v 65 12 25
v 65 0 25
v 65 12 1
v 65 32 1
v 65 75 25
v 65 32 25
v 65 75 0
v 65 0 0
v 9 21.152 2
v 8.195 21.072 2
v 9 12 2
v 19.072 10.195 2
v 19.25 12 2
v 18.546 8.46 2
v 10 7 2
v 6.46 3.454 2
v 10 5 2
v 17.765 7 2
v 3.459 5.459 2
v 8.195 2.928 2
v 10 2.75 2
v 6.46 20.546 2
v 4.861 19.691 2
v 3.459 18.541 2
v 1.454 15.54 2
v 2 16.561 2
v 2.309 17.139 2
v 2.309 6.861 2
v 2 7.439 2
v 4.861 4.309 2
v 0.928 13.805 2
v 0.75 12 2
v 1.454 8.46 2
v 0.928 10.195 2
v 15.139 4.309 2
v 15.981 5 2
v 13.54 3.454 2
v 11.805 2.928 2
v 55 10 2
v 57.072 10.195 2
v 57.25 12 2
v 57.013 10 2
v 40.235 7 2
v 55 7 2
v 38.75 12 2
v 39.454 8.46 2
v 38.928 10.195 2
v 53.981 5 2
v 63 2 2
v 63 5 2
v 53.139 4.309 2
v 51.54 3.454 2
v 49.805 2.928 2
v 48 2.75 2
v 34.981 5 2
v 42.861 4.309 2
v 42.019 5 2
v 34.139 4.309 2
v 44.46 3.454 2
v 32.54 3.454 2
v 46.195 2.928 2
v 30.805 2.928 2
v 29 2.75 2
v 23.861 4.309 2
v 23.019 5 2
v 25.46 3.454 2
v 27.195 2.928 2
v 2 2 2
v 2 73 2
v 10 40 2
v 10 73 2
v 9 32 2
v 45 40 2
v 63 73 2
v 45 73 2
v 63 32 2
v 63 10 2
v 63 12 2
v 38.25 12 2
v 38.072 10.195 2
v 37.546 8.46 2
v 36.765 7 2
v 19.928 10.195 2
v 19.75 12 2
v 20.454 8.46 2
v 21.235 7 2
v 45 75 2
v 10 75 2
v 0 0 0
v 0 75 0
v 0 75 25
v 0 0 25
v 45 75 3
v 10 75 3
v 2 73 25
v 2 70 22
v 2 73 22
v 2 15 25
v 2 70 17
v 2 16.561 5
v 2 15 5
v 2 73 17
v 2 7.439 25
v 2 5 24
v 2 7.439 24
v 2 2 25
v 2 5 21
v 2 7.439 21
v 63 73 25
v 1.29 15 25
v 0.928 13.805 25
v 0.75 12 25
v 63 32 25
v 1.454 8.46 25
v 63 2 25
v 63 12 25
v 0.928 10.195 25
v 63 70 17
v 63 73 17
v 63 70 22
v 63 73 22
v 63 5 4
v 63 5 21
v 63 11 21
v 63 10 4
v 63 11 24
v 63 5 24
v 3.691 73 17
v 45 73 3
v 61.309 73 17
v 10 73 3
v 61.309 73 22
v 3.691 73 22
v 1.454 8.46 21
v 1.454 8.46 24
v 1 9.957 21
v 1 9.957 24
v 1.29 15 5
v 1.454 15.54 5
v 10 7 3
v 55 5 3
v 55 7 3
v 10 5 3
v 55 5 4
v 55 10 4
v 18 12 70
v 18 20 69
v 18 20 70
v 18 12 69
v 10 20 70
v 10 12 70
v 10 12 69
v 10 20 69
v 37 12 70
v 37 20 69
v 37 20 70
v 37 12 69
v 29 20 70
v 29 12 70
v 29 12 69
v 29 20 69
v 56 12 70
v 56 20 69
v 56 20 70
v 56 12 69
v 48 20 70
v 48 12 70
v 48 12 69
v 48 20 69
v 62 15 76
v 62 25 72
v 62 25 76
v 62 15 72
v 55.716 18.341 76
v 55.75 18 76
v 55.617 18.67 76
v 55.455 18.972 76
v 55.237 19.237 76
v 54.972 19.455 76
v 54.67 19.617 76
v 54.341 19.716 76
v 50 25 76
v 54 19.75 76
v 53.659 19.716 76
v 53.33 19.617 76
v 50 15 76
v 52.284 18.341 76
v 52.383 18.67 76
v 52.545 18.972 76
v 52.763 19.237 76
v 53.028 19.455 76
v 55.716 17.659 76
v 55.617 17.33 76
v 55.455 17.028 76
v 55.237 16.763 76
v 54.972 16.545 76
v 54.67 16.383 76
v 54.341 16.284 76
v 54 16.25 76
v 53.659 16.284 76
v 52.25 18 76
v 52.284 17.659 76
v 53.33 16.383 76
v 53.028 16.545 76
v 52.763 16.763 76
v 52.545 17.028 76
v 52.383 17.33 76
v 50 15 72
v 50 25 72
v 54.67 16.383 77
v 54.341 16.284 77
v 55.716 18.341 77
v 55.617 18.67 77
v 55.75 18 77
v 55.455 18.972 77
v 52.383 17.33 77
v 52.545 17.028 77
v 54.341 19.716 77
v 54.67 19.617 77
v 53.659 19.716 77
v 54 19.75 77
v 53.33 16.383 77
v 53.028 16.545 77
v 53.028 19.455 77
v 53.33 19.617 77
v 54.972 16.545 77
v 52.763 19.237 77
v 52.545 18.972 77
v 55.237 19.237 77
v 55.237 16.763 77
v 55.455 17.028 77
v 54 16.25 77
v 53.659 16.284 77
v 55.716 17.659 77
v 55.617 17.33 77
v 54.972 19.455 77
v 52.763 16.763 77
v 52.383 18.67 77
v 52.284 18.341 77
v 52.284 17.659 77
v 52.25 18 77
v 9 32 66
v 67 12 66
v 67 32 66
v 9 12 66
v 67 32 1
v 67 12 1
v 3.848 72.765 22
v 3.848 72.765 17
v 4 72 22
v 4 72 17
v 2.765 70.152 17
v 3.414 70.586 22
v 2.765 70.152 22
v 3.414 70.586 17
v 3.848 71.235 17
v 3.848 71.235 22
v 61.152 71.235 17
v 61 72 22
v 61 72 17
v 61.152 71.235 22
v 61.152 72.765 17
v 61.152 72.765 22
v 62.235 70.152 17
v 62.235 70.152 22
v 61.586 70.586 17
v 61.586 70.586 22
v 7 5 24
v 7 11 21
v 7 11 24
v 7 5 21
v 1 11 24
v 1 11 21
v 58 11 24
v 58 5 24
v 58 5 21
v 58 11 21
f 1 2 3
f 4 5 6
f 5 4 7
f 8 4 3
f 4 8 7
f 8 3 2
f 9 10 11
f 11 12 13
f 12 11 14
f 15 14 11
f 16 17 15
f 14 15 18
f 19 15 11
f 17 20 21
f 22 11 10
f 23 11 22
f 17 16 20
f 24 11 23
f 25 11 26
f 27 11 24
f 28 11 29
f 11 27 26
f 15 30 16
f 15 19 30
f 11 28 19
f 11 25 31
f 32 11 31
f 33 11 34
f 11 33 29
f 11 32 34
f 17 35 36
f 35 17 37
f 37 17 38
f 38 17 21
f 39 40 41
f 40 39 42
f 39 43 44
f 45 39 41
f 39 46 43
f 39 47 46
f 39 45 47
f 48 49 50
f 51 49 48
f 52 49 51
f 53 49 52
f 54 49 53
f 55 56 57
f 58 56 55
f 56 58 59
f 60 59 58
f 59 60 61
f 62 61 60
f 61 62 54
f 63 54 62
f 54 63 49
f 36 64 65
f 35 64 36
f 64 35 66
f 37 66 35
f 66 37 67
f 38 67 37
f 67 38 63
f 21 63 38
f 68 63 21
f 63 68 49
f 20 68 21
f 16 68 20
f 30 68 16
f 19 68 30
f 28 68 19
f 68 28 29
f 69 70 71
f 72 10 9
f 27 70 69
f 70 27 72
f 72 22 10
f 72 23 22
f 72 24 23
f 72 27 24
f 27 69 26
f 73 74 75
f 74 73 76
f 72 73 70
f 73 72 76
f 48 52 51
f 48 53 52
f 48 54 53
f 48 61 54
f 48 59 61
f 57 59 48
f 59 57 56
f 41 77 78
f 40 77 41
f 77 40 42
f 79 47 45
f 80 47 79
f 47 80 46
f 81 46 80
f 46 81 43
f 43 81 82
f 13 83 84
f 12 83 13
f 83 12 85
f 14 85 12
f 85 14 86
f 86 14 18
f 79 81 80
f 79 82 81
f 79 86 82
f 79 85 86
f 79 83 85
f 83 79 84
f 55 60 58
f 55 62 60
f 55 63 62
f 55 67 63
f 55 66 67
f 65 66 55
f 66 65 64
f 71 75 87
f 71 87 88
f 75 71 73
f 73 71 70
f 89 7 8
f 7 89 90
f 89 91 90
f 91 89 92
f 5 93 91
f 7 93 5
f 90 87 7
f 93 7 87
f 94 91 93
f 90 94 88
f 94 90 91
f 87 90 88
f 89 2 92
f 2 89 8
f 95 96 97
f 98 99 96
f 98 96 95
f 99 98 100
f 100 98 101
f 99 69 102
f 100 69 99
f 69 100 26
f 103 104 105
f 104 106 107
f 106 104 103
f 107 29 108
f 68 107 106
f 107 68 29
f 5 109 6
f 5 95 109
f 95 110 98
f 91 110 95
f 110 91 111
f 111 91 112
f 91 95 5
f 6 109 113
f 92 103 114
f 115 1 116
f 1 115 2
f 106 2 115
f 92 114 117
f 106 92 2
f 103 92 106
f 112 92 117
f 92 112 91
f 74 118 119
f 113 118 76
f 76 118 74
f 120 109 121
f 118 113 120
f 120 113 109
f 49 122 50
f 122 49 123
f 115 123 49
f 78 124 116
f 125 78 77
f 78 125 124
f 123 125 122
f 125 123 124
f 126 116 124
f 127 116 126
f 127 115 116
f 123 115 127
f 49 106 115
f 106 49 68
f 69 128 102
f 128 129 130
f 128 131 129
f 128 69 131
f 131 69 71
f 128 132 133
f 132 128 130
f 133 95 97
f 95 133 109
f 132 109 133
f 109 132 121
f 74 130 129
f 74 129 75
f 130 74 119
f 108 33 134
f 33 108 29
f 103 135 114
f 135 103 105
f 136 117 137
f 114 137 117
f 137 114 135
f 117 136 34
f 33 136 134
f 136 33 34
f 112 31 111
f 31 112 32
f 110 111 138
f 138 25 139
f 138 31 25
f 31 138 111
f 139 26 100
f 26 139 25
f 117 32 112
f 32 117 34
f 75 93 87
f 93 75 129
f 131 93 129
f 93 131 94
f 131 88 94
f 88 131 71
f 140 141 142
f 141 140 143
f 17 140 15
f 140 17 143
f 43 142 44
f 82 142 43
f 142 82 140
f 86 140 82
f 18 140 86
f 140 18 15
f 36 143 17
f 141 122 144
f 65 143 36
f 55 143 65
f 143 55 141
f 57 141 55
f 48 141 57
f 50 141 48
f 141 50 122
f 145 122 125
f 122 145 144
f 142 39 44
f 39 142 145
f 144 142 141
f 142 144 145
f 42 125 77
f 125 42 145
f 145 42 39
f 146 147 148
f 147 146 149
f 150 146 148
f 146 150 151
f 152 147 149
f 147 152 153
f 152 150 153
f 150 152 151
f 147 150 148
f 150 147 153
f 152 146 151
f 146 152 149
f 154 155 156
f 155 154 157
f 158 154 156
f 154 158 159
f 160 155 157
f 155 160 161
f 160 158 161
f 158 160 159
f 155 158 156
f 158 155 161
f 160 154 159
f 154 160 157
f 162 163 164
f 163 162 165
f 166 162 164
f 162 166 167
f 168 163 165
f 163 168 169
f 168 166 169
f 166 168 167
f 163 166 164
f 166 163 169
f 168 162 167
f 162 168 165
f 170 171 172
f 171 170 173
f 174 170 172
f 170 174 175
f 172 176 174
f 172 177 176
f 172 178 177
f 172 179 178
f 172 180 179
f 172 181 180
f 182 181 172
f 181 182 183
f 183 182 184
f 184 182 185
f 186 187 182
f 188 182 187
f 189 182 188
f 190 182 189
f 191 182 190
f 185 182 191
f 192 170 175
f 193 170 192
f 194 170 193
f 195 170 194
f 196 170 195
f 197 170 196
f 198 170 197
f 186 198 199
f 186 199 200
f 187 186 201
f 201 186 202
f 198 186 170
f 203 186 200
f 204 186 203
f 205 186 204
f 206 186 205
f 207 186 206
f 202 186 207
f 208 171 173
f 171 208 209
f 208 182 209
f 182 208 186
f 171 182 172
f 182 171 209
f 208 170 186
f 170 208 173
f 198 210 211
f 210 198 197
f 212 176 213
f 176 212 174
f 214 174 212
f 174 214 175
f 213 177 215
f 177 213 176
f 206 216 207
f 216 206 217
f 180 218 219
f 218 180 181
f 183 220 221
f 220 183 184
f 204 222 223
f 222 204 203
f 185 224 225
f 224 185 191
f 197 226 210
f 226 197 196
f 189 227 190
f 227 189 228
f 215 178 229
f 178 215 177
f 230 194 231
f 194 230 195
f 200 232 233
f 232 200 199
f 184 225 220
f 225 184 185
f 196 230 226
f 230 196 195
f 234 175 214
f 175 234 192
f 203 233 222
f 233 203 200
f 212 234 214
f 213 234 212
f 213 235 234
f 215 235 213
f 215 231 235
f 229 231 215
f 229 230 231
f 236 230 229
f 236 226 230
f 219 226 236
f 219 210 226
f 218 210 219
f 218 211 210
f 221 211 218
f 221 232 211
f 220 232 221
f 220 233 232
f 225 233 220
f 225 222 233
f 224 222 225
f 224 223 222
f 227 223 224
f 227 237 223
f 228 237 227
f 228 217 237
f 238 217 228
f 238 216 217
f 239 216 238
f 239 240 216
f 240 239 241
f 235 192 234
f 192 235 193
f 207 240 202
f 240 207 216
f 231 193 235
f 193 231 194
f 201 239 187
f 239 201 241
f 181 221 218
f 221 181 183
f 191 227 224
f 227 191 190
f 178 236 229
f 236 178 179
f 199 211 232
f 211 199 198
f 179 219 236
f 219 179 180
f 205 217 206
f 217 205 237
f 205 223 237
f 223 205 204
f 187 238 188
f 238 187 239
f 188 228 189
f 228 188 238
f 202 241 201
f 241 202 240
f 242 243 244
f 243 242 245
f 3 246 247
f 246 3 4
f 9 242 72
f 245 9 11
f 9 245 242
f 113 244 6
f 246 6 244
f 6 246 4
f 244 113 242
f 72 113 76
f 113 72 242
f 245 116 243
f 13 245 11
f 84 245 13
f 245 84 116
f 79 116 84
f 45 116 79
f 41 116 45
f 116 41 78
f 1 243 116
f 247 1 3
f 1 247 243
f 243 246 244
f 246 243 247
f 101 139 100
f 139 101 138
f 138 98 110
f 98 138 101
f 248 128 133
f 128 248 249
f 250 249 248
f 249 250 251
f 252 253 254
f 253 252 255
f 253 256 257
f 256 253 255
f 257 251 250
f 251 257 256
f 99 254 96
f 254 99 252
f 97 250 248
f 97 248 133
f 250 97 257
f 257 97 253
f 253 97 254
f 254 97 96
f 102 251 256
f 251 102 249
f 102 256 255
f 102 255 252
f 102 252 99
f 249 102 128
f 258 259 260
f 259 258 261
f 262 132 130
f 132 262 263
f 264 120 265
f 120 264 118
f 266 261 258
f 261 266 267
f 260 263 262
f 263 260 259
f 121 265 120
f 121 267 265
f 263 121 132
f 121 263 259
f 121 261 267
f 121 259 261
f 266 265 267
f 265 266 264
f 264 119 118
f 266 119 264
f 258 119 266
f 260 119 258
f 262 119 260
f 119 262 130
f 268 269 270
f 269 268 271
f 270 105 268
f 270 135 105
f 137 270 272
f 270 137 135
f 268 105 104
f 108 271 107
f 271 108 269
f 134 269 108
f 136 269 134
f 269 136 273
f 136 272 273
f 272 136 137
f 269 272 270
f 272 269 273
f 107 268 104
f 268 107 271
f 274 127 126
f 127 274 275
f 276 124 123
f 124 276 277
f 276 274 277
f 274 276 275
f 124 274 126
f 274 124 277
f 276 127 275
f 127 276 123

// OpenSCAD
// INTEGRATED ANTENNA ANALYZER - BATTERY COMPARTMENT MODULE
// 3× 18650 LiFePO4 cell holder with spring contacts and BMS
// Mounts inside rear of main enclosure, accessible via door

// Battery cell dimensions (18650 cylindrical)
cell_diameter = 18;    // mm (standard 18650)
cell_length = 65;      // mm (standard height)
cell_spacing = 1;      // 1mm gap between cells (for easy removal)

// Compartment dimensions
compartment_width = 65;    // Contains 3 cells side-by-side: 18+18+18+2mm gaps = 60mm
compartment_length = 75;   // Slightly longer than cell for BMS module
compartment_height = 25;   // Clearance for spring contacts and BMS

// Material thickness
wall_thickness = 2;        // 2mm walls for strength

// Spring contact specifications
spring_contact_thickness = 1;   // 1mm spring steel
spring_compression = 2;         // 2mm compression range

// BMS module dimensions (estimated for TP4056 module)
bms_width = 35;         // mm
bms_height = 45;        // mm
bms_thickness = 3;      // mm

module battery_cell_holder() {
  // Compartment for three 18650 cells in series
  // Cells held in three parallel bores

  cell_row_x = 10;      // First cell X position
  cell_row_y = 12;      // Y position (centered)
  cell_z = wall_thickness;

  // Cell 1 (positive terminal facing forward)
  translate([cell_row_x, cell_row_y, cell_z])
    cylinder(h = cell_length, d = cell_diameter + 0.5, $fn = 32);

  // Cell 2 (middle, terminal facing backward through BMS)
  translate([cell_row_x + cell_diameter + cell_spacing, cell_row_y, cell_z])
    cylinder(h = cell_length, d = cell_diameter + 0.5, $fn = 32);

  // Cell 3 (terminal facing forward)
  translate([cell_row_x + 2*(cell_diameter + cell_spacing), cell_row_y, cell_z])
    cylinder(h = cell_length, d = cell_diameter + 0.5, $fn = 32);
}

module spring_contact_positive() {
  // Spring contacts for positive terminals (top surface)
  // Curved spring that presses against cell positive terminal

  spring_x = 10;
  spring_y = 12;
  spring_z = wall_thickness + cell_length + 2;

  // Three individual springs for each cell
  for (i = [0:2]) {
    contact_x = spring_x + i * (cell_diameter + cell_spacing);
    translate([contact_x, spring_y, spring_z])
      cube([8, 8, spring_contact_thickness]);
  }
}

module negative_terminal_bus() {
  // Copper bus bar (or conductive plastic) connecting negative terminals
  // Runs along bottom, series connection through BMS

  bus_width = 50;
  bus_thickness = 2;
  bus_height = 1;

  translate([10, 5, wall_thickness])
    cube([bus_width, bus_thickness, bus_height]);

  // Connection to BMS negative input
  translate([55, 5, wall_thickness])
    cube([10, 5, 2]);
}

module bms_module_housing() {
  // Recessed area for BMS (battery management system) module
  // TP4056 or BQ24070 mounted on this platform

  bms_platform_x = 10;
  bms_platform_y = 12 + cell_diameter + 10;
  bms_platform_z = wall_thickness;

  // Platform for BMS PCB
  translate([bms_platform_x, bms_platform_y, bms_platform_z])
    cube([bms_width, bms_height, 1]);

  // Mounting posts for BMS PCB (4 corners)
  post_radius = 1.5;  // 3mm diameter posts
  post_height = 3;

  bms_posts = [
    [bms_platform_x + 2, bms_platform_y + 2],
    [bms_platform_x + bms_width - 2, bms_platform_y + 2],
    [bms_platform_x + 2, bms_platform_y + bms_height - 2],
    [bms_platform_x + bms_width - 2, bms_platform_y + bms_height - 2]
  ];

  for (post = bms_posts) {
    translate([post[0], post[1], bms_platform_z])
      cylinder(h = post_height, r = post_radius, $fn = 16);
  }
}

module positive_terminal_connector() {
  // Wire connector for positive output from BMS
  // XT60 or JST-VH connector interface (user-facing)

  connector_x = 50;
  connector_y = 15;
  connector_z = wall_thickness + cell_length + 5;

  // Connector boss (mechanical support)
  translate([connector_x, connector_y, connector_z])
    cube([12, 10, 4]);

  // Wire lug opening (for soldering battery wires)
  translate([connector_x + 4, connector_y + 3, connector_z + 2])
    cylinder(h = 3, d = 3.5, $fn = 32);
}

module compartment_outer_walls() {
  // Outer housing structure
  // Rectangular box with one open side (for rear door closure)

  // Bottom
  translate([0, 0, 0])
    cube([compartment_width, compartment_length, wall_thickness]);

  // Front wall (facing toward RF electronics)
  translate([0, 0, 0])
    cube([wall_thickness, compartment_length, compartment_height]);

  // Back wall (against enclosure rear panel)
  translate([compartment_width - wall_thickness, 0, 0])
    cube([wall_thickness, compartment_length, compartment_height]);

  // Side walls (left and right)
  translate([0, 0, 0])
    cube([compartment_width, wall_thickness, compartment_height]);

  translate([0, compartment_length - wall_thickness, 0])
    cube([compartment_width, wall_thickness, compartment_height]);

  // Top is open for door closure
}

module insulating_sleeves() {
  // Non-conductive sleeves around each cell
  // Prevents accidental short circuits during installation/removal

  sleeve_thickness = 1;
  sleeve_length = cell_length;

  cell_row_x = 10;
  cell_row_y = 12;
  cell_z = wall_thickness - 1;

  // Three sleeves (one per cell)
  for (i = [0:2]) {
    contact_x = cell_row_x + i * (cell_diameter + cell_spacing);
    translate([contact_x - sleeve_thickness, cell_row_y, cell_z])
      cube([cell_diameter + 2*sleeve_thickness,
            cell_diameter + 2*sleeve_thickness,
            sleeve_length]);
  }
}

module thermal_path_features() {
  // Optimize heat dissipation from cells to enclosure
  // Thermal vias and metal conductors embedded in walls

  // Aluminum insert pads (one per cell side wall)
  // In practice: press aluminum foil or adhesive-backed aluminum sheet to walls

  thermal_pad_width = 20;
  thermal_pad_height = 20;

  // Left side thermal pad
  translate([0, 15, 5])
    cube([wall_thickness, thermal_pad_width, thermal_pad_height]);

  // Right side thermal pad
  translate([compartment_width - wall_thickness, 15, 5])
    cube([wall_thickness, thermal_pad_width, thermal_pad_height]);
}

module door_hinge_bosses() {
  // Mounting bosses for rear access door hinge
  // Two hinges allow door to swing open for battery access

  hinge_post_radius = 2;
  hinge_post_height = 5;

  // Left hinge post (rear left corner)
  translate([2, compartment_length - 3, compartment_height - 8])
    cylinder(h = hinge_post_height, r = hinge_post_radius, $fn = 16);

  // Right hinge post (rear right corner)
  translate([compartment_width - 2, compartment_length - 3, compartment_height - 8])
    cylinder(h = hinge_post_height, r = hinge_post_radius, $fn = 16);
}

module catch_latch_features() {
  // Latches to keep door closed and hold compartment in place
  // Magnetic catches or mechanical latches (snap-fit tabs)

  // Two catch points (left and right edges)
  catch_width = 6;
  catch_height = 3;

  // Top-left catch
  translate([1, 5, compartment_height - 4])
    cube([catch_width, catch_width, catch_height]);

  // Top-right catch
  translate([compartment_width - 1 - catch_width, 5, compartment_height - 4])
    cube([catch_width, catch_width, catch_height]);
}

module assembly() {
  // Main battery compartment assembly

  difference() {
    // Outer walls
    compartment_outer_walls();

    // Remove cell bores
    battery_cell_holder();

    // Remove BMS mounting area
    bms_module_housing();
  }

  // Add internal features
  negative_terminal_bus();
  spring_contact_positive();
  positive_terminal_connector();
  insulating_sleeves();
  thermal_path_features();
  door_hinge_bosses();
  catch_latch_features();
}

// RENDER ASSEMBLY
assembly();

// Exploded view positioning (comment out for final view)
translate([0, 0, 0])
  assembly();

// Show cell positions for reference
%translate([10, 12, 2.5]) cylinder(h=65, d=18, $fn=32);    // Cell 1
%translate([37, 12, 2.5]) cylinder(h=65, d=18, $fn=32);    // Cell 2
%translate([64, 12, 2.5]) cylinder(h=65, d=18, $fn=32);    // Cell 3

// NOTES FOR MANUFACTURING:
// 1. Print in opaque PETG (white or clear preferred for visibility)
// 2. Layer height: 0.15mm for dimensional accuracy on cell holders
// 3. Orientation: print with cell bores oriented vertically (UP)
// 4. Support: minimal, only under BMS platform if needed
// 5. Post-processing: sand to smooth finish, especially cell bore surfaces
// 6. Assembly steps:
//    a. Install cells in bores (notch should face forward for easy removal)
//    b. Insert TP4056 BMS module on mounting posts
//    c. Solder positive wire from spring contacts to BMS input
//    d. Solder negative wire from cell 3 negative to BMS input
//    e. Route power wires (positive, negative, temperature sense) to main PCB
// 7. Connector: use XT60 or JST-VH connector for battery pack output
// 8. Optional: apply kapton tape on battery cell outer surface for additional insulation
// 9. Door: print separate rear access door (snap-fit or hinged)
// 10. Testing: verify voltage with multimeter before connecting to analyzer (should read ~9.6V nominal)
